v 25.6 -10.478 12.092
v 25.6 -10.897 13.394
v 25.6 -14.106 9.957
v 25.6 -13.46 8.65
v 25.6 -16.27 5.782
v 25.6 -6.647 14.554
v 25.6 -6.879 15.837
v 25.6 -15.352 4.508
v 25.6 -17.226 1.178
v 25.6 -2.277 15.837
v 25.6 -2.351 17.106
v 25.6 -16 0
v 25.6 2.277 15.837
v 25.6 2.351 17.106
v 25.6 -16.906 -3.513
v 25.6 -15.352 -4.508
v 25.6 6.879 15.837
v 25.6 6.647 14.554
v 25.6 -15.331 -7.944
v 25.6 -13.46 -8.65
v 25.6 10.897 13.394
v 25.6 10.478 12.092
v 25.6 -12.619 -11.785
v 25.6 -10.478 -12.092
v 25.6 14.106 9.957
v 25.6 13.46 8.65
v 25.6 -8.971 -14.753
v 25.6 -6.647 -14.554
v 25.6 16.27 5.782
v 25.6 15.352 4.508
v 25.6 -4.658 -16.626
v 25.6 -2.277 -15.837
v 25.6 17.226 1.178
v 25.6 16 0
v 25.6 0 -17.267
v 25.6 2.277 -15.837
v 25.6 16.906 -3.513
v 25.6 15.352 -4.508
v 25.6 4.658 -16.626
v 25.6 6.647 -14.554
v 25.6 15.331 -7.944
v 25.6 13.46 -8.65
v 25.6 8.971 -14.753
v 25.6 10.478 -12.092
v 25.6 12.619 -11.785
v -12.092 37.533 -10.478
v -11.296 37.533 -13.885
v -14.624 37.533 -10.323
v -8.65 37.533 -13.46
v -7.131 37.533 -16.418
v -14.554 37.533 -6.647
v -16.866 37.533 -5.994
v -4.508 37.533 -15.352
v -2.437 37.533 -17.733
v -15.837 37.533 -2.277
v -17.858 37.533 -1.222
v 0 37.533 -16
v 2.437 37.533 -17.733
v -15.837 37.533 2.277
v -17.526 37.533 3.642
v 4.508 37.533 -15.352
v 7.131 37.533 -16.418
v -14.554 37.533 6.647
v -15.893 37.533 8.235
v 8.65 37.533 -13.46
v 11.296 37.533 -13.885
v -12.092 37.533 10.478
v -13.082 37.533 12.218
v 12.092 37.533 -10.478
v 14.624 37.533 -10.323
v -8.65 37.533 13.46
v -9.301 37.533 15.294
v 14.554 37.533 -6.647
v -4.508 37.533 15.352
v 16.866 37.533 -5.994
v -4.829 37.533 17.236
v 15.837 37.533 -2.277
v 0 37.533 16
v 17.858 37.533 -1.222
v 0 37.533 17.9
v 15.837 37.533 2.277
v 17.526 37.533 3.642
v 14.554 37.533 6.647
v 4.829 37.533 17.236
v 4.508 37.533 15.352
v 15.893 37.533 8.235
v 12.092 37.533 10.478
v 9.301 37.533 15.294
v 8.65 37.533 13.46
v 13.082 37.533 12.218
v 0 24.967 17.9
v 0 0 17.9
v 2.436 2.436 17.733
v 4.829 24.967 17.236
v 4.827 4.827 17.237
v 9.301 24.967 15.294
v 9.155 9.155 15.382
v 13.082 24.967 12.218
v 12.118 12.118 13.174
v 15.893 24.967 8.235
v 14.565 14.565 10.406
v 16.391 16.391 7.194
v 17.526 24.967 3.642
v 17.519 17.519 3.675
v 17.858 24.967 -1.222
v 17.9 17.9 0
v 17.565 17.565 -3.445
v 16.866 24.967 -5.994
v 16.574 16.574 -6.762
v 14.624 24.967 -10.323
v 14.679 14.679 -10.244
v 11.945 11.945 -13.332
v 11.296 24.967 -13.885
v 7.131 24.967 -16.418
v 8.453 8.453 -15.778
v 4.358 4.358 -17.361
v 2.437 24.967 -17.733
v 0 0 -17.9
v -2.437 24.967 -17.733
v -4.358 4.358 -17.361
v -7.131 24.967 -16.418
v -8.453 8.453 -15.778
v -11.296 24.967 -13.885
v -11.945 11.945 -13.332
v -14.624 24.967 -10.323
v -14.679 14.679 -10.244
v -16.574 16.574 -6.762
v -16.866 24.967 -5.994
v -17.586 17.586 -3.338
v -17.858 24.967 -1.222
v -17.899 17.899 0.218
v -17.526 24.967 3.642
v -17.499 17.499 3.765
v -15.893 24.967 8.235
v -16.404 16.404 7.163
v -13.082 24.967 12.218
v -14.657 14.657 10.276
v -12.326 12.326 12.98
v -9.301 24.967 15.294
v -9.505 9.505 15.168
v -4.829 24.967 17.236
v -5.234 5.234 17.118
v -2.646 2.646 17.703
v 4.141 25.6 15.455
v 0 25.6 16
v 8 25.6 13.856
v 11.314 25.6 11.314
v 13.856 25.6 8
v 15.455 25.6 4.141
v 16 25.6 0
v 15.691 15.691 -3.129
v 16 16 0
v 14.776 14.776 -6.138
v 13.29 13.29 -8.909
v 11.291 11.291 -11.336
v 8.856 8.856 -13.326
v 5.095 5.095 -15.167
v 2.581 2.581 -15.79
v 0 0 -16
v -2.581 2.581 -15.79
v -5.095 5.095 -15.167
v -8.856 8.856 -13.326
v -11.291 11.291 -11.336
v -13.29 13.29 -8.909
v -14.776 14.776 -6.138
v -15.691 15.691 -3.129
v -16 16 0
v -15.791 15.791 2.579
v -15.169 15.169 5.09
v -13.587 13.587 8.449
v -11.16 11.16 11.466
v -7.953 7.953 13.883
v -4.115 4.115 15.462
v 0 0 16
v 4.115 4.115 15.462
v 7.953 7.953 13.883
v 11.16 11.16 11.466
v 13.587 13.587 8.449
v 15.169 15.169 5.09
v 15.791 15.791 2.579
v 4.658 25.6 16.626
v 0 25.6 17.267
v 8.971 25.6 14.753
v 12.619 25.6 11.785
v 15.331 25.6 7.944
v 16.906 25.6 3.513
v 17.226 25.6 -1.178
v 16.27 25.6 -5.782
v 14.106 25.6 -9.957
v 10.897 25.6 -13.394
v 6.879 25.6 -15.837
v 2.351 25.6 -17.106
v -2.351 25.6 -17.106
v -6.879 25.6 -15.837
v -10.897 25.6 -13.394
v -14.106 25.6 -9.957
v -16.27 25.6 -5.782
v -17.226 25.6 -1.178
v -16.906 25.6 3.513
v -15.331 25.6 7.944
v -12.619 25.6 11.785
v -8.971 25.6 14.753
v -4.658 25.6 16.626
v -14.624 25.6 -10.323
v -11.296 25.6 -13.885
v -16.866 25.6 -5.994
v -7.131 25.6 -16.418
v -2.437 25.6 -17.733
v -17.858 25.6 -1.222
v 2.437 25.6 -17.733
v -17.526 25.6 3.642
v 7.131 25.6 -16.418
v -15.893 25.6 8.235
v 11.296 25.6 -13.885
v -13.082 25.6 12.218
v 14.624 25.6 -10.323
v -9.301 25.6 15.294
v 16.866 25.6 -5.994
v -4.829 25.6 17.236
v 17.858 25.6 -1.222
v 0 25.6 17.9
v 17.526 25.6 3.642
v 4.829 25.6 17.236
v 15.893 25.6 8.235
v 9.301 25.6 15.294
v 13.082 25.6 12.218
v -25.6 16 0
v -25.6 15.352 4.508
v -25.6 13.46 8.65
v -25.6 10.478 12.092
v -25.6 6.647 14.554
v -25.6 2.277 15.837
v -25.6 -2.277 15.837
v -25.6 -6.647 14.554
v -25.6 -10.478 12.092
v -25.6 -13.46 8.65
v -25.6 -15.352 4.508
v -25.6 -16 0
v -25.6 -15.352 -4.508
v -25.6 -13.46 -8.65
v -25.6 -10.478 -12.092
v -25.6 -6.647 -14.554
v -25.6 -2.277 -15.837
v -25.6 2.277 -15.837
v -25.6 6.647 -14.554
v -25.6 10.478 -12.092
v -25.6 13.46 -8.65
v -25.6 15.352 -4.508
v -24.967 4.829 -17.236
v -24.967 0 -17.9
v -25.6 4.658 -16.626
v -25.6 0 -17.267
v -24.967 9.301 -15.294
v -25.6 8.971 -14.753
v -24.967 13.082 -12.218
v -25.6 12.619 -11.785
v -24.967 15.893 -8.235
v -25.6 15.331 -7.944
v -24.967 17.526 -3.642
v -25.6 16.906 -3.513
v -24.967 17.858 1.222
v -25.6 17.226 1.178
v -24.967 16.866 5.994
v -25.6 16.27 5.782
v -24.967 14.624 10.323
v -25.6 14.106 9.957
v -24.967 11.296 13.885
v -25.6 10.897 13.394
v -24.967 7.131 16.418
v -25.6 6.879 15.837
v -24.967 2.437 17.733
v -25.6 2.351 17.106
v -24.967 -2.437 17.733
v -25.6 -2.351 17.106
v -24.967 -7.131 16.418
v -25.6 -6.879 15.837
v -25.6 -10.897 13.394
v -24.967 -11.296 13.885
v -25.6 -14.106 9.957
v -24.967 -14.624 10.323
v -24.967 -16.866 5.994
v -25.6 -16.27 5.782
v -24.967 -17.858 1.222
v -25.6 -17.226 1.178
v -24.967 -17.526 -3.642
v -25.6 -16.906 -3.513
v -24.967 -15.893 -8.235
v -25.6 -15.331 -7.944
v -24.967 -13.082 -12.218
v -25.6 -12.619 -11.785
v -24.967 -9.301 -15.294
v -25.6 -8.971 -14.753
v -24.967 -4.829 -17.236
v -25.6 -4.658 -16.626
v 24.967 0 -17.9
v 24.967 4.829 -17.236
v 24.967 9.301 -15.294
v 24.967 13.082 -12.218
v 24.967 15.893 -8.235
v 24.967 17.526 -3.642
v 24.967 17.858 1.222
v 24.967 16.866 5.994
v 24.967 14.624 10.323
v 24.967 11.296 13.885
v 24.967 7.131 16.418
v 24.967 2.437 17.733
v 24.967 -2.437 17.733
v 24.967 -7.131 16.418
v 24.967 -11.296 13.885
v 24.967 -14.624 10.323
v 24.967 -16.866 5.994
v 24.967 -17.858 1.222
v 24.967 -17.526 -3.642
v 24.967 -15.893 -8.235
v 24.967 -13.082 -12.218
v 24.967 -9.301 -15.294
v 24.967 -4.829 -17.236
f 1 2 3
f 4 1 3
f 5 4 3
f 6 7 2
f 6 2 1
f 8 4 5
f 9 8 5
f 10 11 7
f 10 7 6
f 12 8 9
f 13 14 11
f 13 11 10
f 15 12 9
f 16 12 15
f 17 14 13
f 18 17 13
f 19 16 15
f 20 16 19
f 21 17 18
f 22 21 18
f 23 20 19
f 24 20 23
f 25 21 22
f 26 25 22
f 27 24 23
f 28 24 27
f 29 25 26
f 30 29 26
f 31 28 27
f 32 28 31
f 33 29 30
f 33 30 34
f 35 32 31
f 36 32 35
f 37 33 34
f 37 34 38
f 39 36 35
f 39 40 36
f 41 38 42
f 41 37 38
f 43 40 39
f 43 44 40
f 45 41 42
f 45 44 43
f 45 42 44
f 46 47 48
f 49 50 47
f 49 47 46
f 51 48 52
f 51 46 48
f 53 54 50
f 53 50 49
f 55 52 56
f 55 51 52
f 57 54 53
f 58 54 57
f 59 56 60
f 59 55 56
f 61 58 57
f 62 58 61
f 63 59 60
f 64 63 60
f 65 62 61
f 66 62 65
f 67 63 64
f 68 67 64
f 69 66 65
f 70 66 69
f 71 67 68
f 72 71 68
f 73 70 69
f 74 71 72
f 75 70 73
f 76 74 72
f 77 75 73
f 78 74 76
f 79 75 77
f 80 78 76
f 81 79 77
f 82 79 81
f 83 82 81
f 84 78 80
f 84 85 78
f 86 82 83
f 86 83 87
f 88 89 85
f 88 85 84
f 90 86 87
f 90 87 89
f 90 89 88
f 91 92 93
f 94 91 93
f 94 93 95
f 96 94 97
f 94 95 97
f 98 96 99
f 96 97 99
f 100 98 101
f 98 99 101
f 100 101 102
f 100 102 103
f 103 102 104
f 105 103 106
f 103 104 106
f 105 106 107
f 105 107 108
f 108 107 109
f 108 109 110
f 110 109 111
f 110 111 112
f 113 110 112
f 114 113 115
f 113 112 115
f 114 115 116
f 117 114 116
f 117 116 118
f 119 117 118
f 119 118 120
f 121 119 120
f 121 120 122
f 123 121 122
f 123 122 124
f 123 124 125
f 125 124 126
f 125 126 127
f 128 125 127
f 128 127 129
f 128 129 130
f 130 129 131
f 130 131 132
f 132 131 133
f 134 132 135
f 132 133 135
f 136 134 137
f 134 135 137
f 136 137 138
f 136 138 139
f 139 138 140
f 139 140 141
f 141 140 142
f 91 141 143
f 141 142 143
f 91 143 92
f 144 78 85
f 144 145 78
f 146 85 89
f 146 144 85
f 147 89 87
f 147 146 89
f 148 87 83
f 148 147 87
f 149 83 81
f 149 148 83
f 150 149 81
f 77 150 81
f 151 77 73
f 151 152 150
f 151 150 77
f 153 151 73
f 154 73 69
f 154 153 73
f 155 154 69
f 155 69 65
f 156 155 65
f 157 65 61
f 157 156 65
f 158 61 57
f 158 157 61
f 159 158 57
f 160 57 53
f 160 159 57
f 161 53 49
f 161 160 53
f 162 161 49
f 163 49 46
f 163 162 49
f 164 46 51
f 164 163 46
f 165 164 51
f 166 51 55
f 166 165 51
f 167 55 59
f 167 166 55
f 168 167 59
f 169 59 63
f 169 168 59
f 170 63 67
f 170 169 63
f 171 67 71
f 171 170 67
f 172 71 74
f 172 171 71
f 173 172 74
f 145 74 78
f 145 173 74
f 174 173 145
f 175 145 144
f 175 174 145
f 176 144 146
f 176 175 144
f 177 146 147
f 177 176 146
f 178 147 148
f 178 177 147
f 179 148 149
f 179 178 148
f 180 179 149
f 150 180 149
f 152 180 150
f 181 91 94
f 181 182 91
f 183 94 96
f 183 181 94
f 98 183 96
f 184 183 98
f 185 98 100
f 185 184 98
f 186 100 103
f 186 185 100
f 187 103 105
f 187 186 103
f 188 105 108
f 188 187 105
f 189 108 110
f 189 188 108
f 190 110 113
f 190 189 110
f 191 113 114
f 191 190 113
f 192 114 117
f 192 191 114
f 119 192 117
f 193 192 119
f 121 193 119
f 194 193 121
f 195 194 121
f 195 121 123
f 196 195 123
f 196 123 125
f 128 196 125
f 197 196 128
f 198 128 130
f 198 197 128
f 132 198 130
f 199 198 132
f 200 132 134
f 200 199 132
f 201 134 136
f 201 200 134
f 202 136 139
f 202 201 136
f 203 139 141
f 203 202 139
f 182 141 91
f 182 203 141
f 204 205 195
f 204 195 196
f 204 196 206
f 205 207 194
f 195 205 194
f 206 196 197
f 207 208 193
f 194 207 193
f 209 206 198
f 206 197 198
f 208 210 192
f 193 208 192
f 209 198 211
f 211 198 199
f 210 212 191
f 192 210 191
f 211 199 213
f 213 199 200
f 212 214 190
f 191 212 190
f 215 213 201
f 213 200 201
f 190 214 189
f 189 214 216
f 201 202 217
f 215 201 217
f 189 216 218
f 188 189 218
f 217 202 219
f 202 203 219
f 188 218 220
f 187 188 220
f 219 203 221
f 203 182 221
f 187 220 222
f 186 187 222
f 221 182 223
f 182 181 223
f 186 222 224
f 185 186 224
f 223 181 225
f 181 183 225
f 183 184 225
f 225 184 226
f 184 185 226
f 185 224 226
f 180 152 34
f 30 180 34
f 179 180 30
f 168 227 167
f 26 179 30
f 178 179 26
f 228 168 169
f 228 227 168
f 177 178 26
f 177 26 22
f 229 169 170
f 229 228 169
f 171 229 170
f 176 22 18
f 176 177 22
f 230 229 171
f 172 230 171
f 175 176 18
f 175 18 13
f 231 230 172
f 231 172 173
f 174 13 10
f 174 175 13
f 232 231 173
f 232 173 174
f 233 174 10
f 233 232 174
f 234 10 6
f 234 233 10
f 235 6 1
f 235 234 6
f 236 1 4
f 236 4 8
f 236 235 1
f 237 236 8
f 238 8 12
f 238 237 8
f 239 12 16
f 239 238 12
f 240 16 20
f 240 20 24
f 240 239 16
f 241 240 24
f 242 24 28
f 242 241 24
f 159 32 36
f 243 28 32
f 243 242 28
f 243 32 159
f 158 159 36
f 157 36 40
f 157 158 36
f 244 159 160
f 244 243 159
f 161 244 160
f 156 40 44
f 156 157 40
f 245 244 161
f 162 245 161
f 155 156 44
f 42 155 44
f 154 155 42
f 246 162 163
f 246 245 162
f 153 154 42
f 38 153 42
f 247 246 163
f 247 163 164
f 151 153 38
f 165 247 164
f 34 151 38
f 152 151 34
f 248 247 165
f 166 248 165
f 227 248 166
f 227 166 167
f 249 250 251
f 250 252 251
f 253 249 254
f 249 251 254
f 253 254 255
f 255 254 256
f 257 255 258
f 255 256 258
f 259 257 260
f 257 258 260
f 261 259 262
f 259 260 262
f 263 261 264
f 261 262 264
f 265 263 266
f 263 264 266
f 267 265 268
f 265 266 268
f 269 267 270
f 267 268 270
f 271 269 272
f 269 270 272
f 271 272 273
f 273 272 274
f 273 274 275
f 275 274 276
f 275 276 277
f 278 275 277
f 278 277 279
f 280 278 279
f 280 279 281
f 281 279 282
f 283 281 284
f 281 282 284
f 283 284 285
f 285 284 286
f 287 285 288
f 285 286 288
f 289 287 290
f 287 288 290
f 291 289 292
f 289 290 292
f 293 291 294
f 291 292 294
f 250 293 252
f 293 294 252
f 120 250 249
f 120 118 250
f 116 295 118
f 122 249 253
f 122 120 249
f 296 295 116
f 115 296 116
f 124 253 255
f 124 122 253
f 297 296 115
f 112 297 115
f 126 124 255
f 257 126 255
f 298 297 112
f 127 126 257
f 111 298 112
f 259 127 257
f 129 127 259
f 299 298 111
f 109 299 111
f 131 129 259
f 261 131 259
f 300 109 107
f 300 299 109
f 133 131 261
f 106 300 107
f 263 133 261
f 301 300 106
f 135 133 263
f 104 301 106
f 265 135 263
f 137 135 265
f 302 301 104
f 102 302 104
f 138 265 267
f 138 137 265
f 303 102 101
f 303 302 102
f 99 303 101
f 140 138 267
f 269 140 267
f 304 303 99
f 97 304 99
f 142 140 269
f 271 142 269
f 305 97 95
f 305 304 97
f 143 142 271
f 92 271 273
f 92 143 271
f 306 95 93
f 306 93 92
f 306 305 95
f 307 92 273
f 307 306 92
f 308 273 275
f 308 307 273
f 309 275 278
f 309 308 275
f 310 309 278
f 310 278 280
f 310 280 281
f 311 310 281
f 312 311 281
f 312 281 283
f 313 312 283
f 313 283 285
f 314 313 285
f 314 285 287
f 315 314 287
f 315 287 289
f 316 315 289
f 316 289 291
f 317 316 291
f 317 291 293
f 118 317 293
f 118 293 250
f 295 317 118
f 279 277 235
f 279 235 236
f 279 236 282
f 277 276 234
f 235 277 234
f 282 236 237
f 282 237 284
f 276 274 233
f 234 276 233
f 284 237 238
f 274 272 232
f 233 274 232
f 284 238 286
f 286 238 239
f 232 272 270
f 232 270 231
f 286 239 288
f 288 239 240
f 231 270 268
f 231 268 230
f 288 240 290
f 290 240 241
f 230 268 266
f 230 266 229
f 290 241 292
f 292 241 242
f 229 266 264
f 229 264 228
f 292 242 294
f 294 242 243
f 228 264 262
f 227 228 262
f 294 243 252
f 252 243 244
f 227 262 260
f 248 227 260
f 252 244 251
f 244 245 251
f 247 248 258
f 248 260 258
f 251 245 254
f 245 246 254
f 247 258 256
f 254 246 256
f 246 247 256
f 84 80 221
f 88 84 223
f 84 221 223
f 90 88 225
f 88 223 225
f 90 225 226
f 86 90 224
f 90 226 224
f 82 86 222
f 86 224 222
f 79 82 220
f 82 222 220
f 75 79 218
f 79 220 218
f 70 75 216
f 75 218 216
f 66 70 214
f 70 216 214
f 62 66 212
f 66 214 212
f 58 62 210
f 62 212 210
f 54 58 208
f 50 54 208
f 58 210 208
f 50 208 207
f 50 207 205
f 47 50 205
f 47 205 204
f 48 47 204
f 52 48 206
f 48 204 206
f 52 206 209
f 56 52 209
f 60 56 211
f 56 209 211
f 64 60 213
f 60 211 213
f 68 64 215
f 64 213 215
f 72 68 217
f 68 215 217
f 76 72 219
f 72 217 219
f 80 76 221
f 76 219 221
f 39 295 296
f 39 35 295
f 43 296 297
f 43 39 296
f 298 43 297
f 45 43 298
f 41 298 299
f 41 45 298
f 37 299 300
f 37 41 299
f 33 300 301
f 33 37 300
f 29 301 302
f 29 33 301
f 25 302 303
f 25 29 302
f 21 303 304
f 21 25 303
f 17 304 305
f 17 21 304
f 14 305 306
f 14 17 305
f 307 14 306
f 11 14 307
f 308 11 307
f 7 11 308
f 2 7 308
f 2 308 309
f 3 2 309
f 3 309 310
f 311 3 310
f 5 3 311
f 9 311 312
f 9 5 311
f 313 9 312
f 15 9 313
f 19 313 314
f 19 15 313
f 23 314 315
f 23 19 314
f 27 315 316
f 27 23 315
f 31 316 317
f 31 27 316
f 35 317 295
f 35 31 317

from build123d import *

# Parameters (mm, degrees)
RUNROUTE_R           = 17.9
RUNEXTRUDE_DEPTH     = 25.6
OUTLETROUTE_R        = 17.9
OUTLETEXTRUDE_DEPTH  = 25.6
TEESHELL_START       = -25.6
TEESHELL_OUTLINE_R   = 16
TEESHELL_DEPTH       = 51.2
TEESHELL_START_2     = -1e-07
TEESHELL_2_OUTLINE_R = 16
TEESHELL_2_DEPTH     = 25.6000001
TEECHAMFER_SIZE      = 0.633333333
SKETCH_1_R           = 17.9
SKETCH_1_R_2         = 16
EXTRUDE_1_DEPTH      = 11.933333333


with BuildPart() as part:
    # RunRoute → RunExtrude (new body)
    with BuildSketch(Plane(origin=(0, 0, 0), x_dir=(0, 0, -1), z_dir=(1, 0, 0))):
        Circle(RUNROUTE_R)
    runextrude = extrude(amount=RUNEXTRUDE_DEPTH)

    # RunExtrudeMirror: RunExtrude across plane
    add(runextrude.mirror(Plane(origin=(0, 0, 0), x_dir=(0, 0, 1), z_dir=(1, 0, 0))))

    # OutletRoute → OutletExtrude (add)
    with BuildSketch(Plane(origin=(0, 0, 0), x_dir=(1, 0, 0), z_dir=(0, 1, 0))):
        with Locations(Location((0, 0, 0), (0, 0, 270))):
            Circle(OUTLETROUTE_R)
    extrude(amount=OUTLETEXTRUDE_DEPTH)

    # TeeShell: read off the stored shape, not the designer's step
    # TeeShell outline → TeeShell (cut)
    with BuildSketch(Plane.YZ.offset(TEESHELL_START)):
        Circle(TEESHELL_OUTLINE_R)
    extrude(amount=TEESHELL_DEPTH, mode=Mode.SUBTRACT)

    # TeeShell 2 outline → TeeShell 2 (cut)
    with BuildSketch(Plane(origin=(0, 0, 0), x_dir=(1, 0, 0), z_dir=(0, 1, 0)).offset(TEESHELL_START_2)):
        Circle(TEESHELL_2_OUTLINE_R)
    extrude(amount=TEESHELL_2_DEPTH, mode=Mode.SUBTRACT)

    # TeeChamfer
    # the kernel refuses this chamfer: 0.633333333 mm, written as the material it takes off along each edge
    with BuildSketch(Plane(origin=(25.6, 0, 0), x_dir=(0, 0, -1), z_dir=(0, -1, 0))) as teechamfer_piece_1:
        Polygon((17.9, -TEECHAMFER_SIZE), (17.9 - TEECHAMFER_SIZE, 0), (17.9, 0), align=None)
    revolve(axis=Axis((25.6, 0, 0), (1, 0, 0)), mode=Mode.SUBTRACT)
    with BuildSketch(Plane(origin=(-25.6, 0, 0), x_dir=(0, 0, -1), z_dir=(0, -1, 0))) as teechamfer_piece_2:
        Polygon((17.9, TEECHAMFER_SIZE), (17.9 - TEECHAMFER_SIZE, 0), (17.9, 0), align=None)
    revolve(axis=Axis((-25.6, 0, 0), (1, 0, 0)), mode=Mode.SUBTRACT)
    with BuildSketch(Plane(origin=(0, 25.6, 0), x_dir=(0, 0, 1), z_dir=(-1, 0, 0))) as teechamfer_piece_3:
        Polygon((17.9, -TEECHAMFER_SIZE), (17.9 - TEECHAMFER_SIZE, 0), (17.9, 0), align=None)
    revolve(axis=Axis((0, 25.6, 0), (0, 1, 0)), mode=Mode.SUBTRACT)

    # Эскиз1 → Бобышка-Вытянуть1 (add)
    with BuildSketch(Plane(origin=(0, 25.6, 0), x_dir=(1, 0, 0), z_dir=(0, 1, 0))):
        with Locations(Location((0, 0, 0), (0, 0, 270))):
            Circle(SKETCH_1_R)
        with Locations(Location((0, 0, 0), (0, 0, 270))):
            Circle(SKETCH_1_R_2, mode=Mode.SUBTRACT)
    extrude(amount=EXTRUDE_1_DEPTH)


solid = part.part
